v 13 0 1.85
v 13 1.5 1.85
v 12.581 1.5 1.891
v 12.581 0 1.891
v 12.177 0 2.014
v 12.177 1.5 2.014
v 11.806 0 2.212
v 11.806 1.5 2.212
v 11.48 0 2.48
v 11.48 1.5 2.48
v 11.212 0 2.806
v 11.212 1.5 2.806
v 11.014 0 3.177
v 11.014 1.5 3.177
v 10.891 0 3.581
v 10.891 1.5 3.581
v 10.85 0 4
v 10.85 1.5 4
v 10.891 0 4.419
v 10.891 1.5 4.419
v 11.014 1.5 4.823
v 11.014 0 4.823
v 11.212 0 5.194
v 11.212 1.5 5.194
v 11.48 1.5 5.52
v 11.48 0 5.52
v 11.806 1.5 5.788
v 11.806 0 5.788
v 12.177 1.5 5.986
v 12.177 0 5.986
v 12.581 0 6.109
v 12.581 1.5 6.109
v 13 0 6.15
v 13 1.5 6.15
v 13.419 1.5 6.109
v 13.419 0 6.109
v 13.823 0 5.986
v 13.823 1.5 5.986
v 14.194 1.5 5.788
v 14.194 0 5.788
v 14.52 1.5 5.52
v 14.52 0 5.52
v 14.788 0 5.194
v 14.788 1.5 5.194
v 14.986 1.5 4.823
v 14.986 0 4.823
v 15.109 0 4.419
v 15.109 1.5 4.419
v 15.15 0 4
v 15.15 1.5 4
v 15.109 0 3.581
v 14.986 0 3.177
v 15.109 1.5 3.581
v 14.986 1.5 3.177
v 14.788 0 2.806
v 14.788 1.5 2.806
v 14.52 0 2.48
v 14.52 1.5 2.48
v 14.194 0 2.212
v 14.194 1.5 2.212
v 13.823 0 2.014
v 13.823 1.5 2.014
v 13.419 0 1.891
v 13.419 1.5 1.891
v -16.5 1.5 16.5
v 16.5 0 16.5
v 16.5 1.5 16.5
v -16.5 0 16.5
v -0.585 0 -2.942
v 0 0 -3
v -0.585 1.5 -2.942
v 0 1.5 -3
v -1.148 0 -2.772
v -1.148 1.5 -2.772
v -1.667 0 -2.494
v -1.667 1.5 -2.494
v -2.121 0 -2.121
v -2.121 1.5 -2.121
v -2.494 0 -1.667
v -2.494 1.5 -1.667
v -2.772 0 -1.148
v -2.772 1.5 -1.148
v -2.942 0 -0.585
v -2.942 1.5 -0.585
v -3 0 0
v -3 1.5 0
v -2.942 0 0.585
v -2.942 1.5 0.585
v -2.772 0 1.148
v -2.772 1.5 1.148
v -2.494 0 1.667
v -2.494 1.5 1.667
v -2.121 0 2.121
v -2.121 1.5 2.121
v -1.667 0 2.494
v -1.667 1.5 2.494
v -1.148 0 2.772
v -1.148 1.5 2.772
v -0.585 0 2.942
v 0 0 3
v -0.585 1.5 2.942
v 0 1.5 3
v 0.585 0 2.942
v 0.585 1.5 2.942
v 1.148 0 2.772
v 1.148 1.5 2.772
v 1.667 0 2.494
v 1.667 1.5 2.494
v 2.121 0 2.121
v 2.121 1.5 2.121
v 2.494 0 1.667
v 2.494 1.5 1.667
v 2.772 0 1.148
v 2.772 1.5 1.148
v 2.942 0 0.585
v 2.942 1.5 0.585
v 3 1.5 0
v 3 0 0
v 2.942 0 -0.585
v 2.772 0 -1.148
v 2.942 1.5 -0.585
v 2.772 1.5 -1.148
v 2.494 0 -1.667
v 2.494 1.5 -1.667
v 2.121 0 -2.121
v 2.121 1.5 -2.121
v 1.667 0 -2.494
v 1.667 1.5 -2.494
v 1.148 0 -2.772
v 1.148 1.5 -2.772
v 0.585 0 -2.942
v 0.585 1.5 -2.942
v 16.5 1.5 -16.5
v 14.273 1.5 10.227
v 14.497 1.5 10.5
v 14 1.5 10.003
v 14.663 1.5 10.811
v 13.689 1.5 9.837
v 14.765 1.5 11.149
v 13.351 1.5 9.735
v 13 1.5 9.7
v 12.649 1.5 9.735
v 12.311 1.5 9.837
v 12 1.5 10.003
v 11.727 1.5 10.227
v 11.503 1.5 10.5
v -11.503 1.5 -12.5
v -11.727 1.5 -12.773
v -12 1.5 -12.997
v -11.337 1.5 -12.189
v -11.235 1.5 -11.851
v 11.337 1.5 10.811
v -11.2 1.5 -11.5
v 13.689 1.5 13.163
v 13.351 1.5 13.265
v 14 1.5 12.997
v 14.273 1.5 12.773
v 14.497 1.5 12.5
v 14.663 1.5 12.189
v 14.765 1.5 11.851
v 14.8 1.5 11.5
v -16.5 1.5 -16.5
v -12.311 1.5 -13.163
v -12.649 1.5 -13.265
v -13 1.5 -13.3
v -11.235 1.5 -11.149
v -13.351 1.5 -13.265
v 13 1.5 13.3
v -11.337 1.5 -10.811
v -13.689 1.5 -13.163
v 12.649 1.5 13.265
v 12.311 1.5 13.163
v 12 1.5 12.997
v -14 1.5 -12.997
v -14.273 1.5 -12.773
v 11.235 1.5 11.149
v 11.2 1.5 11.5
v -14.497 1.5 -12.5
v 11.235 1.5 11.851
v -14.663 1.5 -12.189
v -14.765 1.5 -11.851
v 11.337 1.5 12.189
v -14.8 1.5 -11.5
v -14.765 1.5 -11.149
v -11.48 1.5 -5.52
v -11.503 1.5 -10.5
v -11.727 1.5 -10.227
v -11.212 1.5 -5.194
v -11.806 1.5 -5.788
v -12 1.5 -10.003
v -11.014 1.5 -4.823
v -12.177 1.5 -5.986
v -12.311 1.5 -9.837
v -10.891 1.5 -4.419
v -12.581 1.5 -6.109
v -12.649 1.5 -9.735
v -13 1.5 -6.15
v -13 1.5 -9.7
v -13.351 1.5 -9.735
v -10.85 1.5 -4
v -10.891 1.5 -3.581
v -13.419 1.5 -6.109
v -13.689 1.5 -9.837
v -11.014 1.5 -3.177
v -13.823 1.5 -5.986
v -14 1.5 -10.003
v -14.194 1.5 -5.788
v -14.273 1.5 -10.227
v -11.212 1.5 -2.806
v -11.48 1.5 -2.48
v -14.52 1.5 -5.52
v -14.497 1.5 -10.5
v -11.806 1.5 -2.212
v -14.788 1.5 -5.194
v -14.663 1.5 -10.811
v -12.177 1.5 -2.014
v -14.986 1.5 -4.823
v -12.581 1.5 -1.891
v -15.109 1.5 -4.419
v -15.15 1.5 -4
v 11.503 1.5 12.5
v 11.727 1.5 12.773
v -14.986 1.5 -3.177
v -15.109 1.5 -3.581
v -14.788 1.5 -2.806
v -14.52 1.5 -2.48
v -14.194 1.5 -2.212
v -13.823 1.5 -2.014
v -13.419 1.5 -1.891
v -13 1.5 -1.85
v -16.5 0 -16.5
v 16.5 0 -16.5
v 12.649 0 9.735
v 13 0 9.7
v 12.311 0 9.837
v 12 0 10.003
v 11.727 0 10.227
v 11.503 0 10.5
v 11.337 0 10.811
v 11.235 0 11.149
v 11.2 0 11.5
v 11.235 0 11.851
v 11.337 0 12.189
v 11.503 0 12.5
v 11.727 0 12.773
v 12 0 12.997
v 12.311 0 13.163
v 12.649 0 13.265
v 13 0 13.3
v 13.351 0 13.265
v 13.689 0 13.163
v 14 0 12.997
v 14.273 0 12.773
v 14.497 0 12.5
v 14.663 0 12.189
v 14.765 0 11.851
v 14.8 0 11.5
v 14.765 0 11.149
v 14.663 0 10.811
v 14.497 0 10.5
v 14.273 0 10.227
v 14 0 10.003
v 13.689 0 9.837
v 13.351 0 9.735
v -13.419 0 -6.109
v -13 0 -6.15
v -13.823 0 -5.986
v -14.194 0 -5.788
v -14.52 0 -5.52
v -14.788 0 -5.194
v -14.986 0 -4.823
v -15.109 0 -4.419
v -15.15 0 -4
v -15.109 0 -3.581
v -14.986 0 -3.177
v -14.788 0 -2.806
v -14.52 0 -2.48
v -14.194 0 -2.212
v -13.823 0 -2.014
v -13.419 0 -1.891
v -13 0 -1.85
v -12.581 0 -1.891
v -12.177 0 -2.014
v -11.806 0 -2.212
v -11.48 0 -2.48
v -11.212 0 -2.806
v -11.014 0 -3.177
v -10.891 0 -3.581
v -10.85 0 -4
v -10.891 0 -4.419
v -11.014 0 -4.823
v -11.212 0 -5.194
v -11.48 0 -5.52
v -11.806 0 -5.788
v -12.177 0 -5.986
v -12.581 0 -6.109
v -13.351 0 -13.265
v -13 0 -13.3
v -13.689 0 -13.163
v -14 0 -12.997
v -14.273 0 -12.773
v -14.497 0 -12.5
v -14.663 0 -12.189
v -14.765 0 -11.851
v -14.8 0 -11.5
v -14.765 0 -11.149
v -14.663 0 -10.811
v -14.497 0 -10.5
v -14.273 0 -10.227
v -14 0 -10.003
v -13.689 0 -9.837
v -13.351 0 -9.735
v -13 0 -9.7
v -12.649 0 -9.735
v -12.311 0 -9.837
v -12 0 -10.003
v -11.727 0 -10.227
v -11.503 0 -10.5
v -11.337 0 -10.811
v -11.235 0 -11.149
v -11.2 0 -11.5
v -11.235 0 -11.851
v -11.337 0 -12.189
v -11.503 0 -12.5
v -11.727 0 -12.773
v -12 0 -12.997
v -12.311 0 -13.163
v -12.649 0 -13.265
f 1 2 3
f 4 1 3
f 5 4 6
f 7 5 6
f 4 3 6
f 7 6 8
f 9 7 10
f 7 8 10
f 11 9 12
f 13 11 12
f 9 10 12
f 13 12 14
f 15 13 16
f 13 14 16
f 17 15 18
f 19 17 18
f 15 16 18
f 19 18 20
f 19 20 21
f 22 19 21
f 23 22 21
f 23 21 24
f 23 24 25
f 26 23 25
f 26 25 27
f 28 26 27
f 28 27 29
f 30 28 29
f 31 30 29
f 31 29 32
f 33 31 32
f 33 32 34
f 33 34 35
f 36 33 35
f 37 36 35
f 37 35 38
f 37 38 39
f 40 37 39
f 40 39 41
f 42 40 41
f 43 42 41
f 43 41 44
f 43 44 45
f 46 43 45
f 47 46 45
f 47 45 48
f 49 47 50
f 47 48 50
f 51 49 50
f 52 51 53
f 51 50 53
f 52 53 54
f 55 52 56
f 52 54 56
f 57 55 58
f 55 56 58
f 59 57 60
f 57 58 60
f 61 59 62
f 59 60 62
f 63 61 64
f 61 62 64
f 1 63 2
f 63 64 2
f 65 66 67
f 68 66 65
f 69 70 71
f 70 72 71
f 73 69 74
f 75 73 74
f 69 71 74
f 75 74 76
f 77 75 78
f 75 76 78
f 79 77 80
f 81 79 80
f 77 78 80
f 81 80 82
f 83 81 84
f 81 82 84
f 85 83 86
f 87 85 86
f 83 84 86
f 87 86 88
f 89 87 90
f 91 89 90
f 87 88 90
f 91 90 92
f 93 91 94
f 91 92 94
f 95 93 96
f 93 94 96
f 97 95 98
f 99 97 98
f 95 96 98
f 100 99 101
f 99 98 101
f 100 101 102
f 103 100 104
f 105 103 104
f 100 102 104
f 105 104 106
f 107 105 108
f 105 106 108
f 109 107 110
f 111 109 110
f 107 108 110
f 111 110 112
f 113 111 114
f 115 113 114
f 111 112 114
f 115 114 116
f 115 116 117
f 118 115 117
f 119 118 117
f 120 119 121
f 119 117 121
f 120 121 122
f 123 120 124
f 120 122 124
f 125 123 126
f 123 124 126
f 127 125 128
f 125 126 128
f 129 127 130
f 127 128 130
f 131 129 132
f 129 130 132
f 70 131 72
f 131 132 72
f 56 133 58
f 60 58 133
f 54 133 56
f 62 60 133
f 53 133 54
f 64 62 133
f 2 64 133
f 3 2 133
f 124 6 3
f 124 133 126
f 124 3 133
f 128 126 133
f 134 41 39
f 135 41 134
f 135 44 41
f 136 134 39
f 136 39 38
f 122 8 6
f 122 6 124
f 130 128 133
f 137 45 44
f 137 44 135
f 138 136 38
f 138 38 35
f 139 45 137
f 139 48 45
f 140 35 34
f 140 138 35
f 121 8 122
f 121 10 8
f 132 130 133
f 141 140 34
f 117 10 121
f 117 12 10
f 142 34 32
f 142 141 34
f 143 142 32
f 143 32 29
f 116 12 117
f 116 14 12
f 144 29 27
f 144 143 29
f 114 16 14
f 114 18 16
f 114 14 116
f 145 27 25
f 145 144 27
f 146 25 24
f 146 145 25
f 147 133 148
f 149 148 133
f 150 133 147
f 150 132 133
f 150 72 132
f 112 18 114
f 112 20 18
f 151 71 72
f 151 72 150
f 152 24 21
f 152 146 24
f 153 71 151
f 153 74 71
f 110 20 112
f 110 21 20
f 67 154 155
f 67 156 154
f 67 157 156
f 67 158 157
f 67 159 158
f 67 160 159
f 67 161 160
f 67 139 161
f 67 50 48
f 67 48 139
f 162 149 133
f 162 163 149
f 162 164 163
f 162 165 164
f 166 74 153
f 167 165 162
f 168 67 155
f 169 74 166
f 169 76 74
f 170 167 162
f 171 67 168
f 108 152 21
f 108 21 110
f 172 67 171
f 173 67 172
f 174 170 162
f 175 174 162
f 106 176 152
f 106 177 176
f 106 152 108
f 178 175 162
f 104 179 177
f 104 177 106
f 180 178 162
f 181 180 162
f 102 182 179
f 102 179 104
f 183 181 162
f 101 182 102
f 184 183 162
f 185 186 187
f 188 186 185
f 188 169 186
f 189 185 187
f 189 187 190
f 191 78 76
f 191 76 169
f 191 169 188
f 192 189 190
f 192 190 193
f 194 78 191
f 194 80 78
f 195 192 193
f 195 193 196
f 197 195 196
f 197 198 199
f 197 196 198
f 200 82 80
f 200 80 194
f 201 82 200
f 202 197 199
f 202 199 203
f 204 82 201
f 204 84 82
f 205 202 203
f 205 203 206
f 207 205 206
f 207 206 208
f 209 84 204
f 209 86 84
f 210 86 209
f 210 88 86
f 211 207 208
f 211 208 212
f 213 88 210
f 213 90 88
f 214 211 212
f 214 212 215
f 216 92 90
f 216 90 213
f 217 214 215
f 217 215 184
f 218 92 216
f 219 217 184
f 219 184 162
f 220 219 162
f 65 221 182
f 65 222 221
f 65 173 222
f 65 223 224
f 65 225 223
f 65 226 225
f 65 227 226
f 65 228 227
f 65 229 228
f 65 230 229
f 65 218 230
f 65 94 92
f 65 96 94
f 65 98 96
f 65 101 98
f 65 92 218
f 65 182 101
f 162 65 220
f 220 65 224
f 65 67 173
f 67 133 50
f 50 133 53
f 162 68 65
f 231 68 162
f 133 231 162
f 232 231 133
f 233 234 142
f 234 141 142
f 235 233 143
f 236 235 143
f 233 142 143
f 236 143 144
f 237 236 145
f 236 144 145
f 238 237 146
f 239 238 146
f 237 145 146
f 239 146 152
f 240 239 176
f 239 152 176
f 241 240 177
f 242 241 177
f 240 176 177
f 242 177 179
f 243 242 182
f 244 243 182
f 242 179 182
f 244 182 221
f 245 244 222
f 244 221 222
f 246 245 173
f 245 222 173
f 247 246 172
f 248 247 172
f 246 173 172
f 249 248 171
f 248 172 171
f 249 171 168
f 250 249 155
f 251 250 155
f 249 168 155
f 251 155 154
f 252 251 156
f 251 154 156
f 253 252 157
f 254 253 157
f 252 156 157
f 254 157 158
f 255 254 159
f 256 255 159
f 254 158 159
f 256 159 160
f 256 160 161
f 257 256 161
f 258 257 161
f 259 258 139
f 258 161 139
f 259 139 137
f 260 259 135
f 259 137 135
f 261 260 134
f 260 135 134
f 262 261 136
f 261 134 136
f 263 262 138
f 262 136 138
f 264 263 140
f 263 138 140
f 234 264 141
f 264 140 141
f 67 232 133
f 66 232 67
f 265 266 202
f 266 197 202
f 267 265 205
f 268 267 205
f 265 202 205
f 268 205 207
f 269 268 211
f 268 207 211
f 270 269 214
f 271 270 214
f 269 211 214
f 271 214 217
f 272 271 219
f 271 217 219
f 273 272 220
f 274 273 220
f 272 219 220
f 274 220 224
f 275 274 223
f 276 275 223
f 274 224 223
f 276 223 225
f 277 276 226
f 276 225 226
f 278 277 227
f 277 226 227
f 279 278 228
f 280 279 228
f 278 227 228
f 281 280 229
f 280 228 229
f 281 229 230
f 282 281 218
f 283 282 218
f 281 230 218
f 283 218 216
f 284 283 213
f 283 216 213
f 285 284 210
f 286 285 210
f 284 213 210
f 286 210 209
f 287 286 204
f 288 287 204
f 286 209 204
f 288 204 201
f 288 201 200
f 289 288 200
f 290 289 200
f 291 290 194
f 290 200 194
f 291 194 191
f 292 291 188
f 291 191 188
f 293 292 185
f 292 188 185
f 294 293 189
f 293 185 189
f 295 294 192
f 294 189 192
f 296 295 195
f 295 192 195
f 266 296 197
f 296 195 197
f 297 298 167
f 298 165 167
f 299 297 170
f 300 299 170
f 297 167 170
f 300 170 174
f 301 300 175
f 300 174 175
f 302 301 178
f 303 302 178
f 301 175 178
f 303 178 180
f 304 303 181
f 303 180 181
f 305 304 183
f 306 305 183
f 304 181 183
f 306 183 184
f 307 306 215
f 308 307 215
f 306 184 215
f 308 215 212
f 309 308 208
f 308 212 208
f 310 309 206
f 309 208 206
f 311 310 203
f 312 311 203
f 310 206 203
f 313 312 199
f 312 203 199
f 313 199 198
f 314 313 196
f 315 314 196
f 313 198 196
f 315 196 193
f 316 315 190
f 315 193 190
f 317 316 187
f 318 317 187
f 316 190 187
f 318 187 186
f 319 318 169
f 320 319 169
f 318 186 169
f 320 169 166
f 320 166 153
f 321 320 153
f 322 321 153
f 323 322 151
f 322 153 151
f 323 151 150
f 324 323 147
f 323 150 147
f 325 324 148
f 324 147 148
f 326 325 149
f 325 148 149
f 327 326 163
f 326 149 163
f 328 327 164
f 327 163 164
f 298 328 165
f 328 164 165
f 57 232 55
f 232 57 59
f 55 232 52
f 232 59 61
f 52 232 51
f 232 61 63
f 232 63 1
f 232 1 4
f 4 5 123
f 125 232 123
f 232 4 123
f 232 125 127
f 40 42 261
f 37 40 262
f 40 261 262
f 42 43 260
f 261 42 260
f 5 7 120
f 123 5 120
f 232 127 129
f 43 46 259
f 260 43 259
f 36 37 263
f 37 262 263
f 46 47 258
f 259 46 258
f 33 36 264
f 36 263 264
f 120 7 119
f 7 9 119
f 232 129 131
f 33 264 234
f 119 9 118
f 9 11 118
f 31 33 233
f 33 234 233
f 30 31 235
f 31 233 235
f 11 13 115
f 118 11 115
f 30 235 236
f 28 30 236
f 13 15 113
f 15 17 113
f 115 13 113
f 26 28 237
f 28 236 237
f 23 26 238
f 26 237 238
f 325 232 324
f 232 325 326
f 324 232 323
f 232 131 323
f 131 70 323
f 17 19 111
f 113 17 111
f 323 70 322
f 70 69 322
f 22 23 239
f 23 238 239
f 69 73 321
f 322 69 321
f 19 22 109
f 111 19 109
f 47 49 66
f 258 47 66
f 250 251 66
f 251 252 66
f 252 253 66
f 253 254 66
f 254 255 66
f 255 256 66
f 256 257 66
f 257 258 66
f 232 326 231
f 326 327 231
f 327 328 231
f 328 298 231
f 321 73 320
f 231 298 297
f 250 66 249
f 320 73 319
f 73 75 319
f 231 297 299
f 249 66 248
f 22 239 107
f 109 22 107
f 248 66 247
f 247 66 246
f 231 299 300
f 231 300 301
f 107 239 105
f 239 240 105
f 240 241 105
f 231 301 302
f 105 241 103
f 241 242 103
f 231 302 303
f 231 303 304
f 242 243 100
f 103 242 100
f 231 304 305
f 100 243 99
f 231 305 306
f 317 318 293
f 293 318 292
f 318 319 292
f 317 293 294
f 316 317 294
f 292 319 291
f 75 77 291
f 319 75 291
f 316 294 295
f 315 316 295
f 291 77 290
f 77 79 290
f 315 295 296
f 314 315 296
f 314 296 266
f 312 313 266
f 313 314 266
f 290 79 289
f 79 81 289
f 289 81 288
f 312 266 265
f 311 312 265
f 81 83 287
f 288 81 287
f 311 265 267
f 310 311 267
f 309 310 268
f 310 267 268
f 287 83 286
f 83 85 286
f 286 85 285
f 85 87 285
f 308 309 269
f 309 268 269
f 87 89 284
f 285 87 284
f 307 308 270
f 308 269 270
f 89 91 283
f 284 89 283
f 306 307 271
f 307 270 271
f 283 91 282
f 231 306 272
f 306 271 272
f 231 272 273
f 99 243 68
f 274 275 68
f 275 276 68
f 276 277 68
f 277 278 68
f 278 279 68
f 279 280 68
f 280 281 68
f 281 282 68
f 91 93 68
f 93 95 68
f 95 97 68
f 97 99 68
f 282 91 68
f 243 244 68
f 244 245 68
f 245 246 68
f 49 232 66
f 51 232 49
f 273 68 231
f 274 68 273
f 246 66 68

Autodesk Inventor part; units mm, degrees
ref_plane "YZ Plane" through (0, 0, 0) normal (1, 0, 0) x (0, 1, 0)
ref_plane "XZ Plane" through (0, 0, 0) normal (0, 1, 0) x (-1, 0, 0)
ref_plane "XY Plane" through (0, 0, 0) normal (0, 0, 1) x (1, 0, 0)
sketch "Sketch1" plane through (0, 0, 0) normal (0, 1, 0) x (-1, 0, 0)
  line L0 (16.5, -16.5) -> (-16.5, -16.5)
  line L1 (-16.5, -16.5) -> (-16.5, 16.5)
  line L2 (-16.5, 16.5) -> (16.5, 16.5)
  line L3 (16.5, 16.5) -> (16.5, -16.5)
  point P0 (0, 0)
  point P1 (16.5, 0)
  point P2 (0, -16.5)
  dimension "d0" = 33
  dimension "d1" = 33
extrude "Plate1" add sketch "Sketch1" along normal blind 1.5
sketch "Sketch2" plane through (0, 0, 0) normal (0, 1, 0) x (-1, 0, 0)
  point P0 (0, 0)
  point P1 (0, 0)
hole "Hole1" at (0, 0, 0) direction (0, 1, 0) diameter 6 end through all
sketch "Sketch3" plane through (0, 0, 0) normal (0, 1, 0) x (-1, 0, 0)
  line L0 (0, 0) -> (0, -16.3603)
  point P0 (13, -4)
  point P1 (-13, 4)
  dimension "d10" = 4
  dimension "d11" = 13
  dimension "d12" = 4
  dimension "d13" = 13
hole "Hole2" at (-13, 0, -4) at (13, 0, 4) direction (0, 1, 0) diameter 4.3 end through all
sketch "Sketch4" plane through (0, 0, 0) normal (0, 1, 0) x (-1, 0, 0)
  point P0 (0, 0)
  point P1 (13, -11.5)
  point P2 (-13, 11.5)
  dimension "d21" = 13
  dimension "d22" = 11.5
  dimension "d23" = 11.5
  dimension "d24" = 13
hole "Hole3" at (-13, 0, -11.5) at (13, 0, 11.5) direction (0, 1, 0) diameter 3.6 end through all
equation "\"d8\" = Thickness"
equation "\"d19\" = Thickness"
equation "\"d30\" = Thickness"
equation "\"d32\" = Thickness"
equation "\"BendRadius\" = Thickness"
equation "\"BendReliefWidth\" = Thickness"
equation "\"BendReliefDepth\" = 0.5 * Thickness"
equation "\"CornerReliefSize\" = 4 * Thickness"
equation "\"MinimumRemnant\" = 2 * Thickness"
equation "\"TransitionRadius\" = BendRadius"
equation "\"JacobiRadiusSize\" = BendRadius"
equation "\"GapSize\" = Thickness"
equation "\"d2\" = BendRadius"
equation "\"Thickness\" = 1.5"
properties part number "Luxcan P1"
